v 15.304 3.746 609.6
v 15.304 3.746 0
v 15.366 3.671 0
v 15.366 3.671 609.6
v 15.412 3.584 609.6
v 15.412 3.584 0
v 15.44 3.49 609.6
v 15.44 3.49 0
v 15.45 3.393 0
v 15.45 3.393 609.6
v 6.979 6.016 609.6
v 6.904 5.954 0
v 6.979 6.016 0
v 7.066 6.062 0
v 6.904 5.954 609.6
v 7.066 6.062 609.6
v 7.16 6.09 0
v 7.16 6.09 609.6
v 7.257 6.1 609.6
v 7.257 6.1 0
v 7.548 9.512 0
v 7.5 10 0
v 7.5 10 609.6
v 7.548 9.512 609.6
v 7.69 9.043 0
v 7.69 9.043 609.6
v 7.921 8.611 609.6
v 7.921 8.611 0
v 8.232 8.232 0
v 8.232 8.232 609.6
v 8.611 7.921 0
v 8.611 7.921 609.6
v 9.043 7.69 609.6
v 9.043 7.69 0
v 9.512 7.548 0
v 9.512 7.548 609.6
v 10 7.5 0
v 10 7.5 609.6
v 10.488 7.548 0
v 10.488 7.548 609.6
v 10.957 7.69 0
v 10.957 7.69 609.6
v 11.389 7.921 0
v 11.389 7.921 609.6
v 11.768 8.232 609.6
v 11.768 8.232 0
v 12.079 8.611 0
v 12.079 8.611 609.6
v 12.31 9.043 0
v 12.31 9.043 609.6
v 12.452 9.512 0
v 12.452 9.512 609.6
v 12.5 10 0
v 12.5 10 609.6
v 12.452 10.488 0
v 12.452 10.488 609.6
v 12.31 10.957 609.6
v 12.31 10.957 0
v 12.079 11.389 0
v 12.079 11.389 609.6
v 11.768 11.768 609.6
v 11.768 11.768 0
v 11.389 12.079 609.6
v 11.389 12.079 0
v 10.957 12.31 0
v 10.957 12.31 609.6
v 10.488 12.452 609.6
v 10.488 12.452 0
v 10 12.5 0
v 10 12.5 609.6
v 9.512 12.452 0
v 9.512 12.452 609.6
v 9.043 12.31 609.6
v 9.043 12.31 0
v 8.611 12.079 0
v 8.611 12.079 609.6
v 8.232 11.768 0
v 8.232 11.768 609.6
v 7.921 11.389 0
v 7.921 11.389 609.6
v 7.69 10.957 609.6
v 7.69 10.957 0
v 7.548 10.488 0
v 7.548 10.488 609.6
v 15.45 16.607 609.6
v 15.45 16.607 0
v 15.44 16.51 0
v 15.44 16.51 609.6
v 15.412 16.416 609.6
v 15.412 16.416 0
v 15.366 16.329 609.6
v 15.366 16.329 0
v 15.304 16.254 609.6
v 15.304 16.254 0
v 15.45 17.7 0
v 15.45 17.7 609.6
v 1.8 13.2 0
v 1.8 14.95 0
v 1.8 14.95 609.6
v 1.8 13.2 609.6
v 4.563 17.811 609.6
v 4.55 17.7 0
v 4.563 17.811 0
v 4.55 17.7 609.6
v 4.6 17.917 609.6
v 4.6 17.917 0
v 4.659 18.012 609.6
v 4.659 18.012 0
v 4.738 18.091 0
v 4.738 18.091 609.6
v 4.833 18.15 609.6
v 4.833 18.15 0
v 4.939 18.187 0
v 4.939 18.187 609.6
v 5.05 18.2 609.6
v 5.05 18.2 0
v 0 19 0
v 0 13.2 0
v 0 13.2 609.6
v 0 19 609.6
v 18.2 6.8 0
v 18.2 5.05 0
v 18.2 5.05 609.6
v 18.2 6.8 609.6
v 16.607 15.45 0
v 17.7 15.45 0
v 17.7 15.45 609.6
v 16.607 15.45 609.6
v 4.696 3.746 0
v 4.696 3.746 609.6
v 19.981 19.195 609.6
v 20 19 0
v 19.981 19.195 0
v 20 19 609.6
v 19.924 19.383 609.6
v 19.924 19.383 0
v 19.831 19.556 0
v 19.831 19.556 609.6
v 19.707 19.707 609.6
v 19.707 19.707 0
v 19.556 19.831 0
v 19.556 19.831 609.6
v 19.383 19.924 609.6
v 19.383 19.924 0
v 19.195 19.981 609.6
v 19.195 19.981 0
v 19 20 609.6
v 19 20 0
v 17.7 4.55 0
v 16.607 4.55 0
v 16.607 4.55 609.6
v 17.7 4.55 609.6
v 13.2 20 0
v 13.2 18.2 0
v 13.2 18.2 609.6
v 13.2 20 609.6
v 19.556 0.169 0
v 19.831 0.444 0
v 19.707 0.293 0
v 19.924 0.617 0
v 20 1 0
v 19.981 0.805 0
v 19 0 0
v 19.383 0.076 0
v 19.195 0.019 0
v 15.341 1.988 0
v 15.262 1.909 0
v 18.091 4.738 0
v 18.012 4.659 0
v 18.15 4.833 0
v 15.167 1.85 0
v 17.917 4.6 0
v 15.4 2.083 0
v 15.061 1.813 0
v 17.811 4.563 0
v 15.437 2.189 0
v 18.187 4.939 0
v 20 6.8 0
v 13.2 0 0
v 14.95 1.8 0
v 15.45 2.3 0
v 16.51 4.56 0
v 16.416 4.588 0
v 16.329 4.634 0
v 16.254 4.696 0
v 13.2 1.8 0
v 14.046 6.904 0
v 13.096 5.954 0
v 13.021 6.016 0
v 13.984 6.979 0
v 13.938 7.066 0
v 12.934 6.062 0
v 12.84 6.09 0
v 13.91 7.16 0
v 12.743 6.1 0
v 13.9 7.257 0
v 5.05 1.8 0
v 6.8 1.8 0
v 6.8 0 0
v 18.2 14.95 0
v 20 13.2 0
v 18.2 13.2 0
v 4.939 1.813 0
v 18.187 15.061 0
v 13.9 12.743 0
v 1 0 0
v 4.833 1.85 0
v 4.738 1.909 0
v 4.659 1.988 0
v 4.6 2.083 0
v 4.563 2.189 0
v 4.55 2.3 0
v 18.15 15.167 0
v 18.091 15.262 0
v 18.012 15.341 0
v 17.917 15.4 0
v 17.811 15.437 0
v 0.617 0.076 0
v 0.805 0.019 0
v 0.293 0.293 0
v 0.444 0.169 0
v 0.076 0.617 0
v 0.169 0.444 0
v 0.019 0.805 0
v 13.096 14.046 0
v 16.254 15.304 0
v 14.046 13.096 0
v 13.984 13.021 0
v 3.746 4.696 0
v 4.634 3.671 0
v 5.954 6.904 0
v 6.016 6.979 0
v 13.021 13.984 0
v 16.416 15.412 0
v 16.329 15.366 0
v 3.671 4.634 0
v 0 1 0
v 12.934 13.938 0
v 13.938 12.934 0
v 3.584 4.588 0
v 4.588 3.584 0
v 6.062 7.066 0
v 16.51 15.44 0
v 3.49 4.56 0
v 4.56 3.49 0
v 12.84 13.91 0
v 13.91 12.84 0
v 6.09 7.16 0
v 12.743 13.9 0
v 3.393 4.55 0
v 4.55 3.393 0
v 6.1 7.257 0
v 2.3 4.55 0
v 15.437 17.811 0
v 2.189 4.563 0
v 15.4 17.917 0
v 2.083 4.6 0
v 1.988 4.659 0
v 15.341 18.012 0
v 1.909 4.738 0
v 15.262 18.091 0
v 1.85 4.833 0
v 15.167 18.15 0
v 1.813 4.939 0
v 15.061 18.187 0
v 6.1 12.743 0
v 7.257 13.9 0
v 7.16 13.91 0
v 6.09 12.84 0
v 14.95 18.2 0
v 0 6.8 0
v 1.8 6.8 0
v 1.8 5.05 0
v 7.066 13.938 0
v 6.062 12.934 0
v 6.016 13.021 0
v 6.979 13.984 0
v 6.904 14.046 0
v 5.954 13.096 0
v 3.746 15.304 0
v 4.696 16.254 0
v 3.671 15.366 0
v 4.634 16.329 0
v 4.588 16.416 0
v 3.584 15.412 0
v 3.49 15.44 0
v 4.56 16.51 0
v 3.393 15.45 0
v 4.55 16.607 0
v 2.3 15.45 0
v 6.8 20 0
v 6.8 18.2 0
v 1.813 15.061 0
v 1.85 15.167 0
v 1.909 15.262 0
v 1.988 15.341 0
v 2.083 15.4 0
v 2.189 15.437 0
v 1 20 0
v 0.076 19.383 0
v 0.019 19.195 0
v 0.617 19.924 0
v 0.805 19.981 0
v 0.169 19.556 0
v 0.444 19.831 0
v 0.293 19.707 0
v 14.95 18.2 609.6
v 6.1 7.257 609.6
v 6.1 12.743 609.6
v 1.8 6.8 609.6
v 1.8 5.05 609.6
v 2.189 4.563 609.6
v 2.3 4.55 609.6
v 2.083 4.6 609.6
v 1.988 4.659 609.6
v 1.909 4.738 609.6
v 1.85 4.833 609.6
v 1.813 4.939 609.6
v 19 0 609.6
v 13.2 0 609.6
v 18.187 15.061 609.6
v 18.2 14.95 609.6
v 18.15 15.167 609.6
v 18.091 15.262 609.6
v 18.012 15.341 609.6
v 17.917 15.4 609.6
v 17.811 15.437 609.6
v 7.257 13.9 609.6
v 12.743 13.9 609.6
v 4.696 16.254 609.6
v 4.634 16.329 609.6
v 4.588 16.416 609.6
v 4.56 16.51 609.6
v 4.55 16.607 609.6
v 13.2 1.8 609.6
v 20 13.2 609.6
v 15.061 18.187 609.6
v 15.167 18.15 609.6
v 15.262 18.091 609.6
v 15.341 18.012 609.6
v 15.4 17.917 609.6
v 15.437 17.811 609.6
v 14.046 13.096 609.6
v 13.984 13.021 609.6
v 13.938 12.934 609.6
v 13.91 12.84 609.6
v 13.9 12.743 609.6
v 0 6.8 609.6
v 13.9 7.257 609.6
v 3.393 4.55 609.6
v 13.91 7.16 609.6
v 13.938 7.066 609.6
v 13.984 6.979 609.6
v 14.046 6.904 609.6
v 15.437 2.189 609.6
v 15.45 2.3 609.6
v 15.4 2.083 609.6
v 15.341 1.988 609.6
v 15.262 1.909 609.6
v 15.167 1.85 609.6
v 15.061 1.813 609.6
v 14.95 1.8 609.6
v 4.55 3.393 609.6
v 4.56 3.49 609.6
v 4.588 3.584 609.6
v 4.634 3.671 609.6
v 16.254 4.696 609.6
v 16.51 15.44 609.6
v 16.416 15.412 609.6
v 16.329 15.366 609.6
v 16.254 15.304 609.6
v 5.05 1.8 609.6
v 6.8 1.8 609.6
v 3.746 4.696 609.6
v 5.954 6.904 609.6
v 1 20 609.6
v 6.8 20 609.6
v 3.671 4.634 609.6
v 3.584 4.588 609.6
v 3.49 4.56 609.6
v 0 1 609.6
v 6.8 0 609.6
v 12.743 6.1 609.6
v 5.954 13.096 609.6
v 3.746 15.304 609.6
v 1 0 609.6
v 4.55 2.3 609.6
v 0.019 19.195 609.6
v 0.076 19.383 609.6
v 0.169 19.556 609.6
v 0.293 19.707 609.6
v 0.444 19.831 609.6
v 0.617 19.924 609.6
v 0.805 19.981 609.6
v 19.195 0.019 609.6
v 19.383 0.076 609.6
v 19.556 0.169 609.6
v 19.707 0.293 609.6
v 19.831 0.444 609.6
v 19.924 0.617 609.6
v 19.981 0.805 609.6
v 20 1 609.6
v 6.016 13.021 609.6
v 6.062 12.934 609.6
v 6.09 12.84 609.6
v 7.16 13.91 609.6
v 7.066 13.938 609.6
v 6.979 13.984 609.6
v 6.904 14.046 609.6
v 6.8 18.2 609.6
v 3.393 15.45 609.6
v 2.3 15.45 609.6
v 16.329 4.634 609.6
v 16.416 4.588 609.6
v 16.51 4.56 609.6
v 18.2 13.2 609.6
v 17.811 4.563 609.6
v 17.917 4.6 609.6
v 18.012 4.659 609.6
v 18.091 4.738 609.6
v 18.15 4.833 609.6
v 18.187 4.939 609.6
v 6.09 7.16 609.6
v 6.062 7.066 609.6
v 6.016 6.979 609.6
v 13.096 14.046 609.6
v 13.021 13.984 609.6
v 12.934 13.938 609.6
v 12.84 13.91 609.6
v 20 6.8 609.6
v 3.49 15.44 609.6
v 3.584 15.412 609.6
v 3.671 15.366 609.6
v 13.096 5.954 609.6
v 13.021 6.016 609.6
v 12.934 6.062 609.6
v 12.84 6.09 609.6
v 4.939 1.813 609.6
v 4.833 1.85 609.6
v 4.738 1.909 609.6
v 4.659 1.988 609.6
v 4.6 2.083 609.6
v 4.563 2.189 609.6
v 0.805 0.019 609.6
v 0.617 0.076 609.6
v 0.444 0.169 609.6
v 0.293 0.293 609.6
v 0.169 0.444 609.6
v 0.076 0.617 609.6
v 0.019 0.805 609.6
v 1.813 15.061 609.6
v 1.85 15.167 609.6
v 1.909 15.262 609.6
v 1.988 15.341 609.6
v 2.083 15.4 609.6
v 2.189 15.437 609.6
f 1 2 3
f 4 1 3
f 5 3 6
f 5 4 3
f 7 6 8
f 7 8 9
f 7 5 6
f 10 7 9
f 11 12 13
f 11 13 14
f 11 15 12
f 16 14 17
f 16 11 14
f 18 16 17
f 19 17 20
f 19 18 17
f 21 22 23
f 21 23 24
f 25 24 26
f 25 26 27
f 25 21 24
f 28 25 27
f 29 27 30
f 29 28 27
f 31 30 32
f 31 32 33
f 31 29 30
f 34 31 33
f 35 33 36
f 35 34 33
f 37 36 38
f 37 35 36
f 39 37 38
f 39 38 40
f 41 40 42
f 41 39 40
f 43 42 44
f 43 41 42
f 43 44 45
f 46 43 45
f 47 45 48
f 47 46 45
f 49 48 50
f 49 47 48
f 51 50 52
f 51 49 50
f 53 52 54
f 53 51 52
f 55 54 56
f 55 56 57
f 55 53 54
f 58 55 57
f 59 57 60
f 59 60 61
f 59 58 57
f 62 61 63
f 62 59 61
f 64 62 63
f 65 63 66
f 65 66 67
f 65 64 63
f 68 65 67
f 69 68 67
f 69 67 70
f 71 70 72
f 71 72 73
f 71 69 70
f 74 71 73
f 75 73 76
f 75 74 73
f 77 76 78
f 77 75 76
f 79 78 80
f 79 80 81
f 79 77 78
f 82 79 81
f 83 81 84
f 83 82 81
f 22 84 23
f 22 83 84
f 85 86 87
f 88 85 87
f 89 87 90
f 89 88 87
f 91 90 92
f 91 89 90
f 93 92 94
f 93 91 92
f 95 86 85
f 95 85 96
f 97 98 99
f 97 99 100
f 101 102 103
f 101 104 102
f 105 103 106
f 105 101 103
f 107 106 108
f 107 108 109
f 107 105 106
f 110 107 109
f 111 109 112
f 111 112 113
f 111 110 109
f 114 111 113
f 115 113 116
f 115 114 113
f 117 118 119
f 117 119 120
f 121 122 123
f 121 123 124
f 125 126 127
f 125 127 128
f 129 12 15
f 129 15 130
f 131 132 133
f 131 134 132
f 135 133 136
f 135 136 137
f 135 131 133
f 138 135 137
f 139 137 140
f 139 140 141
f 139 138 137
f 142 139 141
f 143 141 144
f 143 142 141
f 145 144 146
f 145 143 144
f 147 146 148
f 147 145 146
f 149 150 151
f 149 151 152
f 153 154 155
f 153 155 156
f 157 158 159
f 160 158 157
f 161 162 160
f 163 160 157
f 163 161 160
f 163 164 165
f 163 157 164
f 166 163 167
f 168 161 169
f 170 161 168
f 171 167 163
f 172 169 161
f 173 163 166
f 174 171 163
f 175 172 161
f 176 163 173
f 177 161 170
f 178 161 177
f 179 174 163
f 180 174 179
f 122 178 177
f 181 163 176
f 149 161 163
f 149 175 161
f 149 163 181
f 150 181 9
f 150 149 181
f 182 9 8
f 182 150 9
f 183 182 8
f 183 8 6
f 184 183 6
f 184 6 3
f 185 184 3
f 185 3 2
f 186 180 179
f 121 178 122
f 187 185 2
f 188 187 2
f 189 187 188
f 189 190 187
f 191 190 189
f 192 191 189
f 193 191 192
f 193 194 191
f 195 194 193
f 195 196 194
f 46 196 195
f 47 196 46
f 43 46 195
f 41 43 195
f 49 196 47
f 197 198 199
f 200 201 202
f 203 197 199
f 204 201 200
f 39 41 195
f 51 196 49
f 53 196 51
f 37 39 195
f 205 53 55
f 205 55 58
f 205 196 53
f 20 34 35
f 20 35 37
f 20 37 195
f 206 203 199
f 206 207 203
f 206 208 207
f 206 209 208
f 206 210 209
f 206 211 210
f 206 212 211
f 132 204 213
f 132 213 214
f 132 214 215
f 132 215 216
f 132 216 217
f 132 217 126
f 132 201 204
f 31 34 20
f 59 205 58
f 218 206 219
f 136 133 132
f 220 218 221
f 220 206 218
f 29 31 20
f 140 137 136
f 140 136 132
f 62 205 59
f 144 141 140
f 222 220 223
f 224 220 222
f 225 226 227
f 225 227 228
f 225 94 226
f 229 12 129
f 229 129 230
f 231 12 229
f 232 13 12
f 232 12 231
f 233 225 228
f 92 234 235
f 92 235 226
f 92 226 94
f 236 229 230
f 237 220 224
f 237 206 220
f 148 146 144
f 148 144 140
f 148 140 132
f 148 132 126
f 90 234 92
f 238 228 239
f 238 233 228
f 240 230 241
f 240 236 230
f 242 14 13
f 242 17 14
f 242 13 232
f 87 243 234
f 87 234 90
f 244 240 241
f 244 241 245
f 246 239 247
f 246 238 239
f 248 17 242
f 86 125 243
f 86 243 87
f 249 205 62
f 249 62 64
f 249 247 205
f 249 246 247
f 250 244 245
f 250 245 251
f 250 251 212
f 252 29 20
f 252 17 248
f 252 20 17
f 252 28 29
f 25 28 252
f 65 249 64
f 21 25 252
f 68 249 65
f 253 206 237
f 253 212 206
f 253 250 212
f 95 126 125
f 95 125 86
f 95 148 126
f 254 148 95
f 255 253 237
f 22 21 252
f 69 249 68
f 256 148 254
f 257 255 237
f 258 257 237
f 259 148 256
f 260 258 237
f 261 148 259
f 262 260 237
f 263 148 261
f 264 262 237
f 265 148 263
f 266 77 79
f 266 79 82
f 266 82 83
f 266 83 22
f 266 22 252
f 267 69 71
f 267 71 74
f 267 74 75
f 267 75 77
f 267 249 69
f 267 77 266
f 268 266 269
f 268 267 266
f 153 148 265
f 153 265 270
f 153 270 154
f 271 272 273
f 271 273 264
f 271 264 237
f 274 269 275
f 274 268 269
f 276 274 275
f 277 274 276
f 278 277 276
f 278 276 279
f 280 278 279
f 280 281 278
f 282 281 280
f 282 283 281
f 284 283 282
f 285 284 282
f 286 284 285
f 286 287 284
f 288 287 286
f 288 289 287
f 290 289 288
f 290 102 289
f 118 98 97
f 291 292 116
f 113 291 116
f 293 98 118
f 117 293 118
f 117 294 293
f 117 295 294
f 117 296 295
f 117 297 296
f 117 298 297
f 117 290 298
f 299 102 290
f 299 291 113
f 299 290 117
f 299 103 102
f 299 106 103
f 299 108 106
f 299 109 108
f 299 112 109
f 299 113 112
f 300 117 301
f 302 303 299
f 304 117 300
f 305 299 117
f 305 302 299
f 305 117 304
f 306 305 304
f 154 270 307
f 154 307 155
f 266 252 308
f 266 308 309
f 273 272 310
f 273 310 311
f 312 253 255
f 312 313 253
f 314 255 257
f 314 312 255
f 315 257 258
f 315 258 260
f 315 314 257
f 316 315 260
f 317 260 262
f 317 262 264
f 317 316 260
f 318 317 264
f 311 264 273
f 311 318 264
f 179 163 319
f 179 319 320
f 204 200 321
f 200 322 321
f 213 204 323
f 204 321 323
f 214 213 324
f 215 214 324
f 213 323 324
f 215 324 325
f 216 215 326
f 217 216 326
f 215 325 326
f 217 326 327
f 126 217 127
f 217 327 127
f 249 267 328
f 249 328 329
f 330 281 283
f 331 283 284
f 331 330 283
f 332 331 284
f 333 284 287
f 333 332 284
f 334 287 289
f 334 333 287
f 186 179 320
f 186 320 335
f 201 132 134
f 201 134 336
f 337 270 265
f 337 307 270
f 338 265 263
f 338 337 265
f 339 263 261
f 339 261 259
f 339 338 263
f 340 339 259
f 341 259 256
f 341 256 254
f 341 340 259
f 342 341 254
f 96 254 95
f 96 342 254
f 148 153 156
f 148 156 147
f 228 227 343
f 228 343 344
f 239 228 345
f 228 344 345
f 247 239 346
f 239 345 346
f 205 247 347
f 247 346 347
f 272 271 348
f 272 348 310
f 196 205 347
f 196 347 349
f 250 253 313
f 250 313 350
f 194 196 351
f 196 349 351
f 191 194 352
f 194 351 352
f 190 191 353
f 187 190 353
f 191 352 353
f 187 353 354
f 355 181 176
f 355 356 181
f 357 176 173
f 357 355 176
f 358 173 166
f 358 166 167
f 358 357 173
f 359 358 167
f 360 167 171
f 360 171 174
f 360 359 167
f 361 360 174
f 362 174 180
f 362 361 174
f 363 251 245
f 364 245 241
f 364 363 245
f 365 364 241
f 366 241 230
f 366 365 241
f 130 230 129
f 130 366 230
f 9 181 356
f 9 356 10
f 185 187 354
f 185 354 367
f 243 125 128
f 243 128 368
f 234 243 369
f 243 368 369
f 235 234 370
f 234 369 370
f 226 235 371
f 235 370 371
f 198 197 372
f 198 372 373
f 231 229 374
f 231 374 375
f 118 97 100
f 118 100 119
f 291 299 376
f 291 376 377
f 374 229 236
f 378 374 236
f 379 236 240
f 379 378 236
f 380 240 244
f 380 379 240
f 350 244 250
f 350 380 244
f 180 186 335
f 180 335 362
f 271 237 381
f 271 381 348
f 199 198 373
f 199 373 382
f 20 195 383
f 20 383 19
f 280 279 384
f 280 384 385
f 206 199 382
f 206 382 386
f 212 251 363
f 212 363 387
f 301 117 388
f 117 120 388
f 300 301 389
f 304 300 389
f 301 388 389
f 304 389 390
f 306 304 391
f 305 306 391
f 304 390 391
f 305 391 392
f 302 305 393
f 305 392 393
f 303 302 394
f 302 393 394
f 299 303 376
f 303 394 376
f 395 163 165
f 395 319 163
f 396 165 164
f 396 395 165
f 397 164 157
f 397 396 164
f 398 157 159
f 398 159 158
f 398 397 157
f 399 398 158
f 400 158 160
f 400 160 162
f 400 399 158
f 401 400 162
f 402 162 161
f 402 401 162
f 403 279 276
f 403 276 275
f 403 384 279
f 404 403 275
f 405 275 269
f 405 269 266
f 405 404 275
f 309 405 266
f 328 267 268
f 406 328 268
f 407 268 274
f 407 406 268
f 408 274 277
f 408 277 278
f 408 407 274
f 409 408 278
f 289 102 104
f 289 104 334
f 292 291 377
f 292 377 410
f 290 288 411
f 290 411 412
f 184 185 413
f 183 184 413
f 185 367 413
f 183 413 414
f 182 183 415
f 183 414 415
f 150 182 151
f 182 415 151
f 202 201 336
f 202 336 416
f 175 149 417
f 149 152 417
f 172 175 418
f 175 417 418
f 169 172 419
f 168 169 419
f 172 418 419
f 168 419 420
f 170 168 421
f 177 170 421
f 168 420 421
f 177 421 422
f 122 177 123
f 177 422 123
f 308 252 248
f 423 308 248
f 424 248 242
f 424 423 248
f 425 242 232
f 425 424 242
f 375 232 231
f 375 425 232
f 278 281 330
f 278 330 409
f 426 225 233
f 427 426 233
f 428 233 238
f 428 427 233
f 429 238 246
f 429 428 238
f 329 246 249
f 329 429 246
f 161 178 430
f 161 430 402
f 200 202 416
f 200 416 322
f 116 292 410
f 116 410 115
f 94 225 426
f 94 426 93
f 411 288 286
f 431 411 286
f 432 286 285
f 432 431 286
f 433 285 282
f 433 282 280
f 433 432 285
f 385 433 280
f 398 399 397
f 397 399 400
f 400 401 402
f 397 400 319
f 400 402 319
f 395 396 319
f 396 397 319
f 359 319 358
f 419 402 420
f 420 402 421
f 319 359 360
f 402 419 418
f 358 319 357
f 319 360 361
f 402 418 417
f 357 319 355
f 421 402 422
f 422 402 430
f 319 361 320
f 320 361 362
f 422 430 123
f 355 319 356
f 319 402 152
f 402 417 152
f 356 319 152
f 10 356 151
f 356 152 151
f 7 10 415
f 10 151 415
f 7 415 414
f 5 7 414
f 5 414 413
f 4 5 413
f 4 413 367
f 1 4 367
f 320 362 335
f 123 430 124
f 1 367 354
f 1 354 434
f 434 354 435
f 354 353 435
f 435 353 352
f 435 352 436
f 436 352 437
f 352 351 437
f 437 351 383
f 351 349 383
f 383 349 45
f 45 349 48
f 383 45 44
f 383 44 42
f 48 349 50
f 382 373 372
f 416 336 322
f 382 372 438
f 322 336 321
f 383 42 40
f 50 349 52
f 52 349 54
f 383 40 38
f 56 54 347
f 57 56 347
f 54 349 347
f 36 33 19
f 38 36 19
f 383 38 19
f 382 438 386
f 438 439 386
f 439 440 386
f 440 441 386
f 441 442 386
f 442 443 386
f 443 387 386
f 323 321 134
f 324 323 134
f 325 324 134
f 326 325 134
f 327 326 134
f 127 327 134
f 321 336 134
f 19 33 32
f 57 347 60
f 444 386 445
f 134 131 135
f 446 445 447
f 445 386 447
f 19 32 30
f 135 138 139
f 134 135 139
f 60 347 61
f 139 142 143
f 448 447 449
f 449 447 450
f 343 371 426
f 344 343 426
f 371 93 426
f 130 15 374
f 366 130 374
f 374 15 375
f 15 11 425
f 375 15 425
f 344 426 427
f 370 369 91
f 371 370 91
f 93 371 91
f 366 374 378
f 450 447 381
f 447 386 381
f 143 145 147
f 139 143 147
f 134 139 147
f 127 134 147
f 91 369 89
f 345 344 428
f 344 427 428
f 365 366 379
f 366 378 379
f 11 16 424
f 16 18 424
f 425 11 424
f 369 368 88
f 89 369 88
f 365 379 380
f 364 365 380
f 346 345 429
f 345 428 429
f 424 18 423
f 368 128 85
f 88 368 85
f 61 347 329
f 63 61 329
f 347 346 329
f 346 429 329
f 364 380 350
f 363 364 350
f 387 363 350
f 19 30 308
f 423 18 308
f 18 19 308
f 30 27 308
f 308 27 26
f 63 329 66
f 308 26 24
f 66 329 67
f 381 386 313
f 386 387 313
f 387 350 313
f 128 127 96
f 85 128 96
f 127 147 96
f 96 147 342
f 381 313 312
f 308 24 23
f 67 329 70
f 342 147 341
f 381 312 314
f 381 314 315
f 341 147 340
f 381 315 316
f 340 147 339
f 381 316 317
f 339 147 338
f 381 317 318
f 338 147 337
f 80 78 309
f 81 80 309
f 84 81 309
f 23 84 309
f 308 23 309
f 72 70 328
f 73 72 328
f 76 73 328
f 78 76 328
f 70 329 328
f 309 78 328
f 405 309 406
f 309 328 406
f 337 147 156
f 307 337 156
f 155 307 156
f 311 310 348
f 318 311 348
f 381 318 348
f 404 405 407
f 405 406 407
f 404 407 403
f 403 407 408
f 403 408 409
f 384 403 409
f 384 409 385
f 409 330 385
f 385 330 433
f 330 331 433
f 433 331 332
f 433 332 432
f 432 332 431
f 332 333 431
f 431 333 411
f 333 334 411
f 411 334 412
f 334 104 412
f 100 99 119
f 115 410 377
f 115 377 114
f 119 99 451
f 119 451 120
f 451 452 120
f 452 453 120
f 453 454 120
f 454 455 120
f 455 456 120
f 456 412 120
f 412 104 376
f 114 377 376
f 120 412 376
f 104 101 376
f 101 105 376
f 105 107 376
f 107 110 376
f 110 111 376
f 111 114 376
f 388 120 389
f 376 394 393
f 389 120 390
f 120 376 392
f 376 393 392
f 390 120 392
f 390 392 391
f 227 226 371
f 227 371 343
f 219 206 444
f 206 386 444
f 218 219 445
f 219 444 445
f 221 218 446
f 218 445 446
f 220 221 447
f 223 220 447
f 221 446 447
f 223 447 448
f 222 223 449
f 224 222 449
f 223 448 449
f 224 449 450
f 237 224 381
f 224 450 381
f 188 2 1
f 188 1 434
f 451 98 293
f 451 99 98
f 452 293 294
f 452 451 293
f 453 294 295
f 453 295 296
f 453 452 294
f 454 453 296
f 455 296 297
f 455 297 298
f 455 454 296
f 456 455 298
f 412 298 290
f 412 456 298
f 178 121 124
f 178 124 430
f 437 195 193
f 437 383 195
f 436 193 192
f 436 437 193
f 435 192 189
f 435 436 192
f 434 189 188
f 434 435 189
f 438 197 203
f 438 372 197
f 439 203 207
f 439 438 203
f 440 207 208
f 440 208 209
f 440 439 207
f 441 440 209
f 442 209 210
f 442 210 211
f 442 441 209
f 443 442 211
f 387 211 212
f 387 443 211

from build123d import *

# Parameters (mm, degrees)
SKETCH1_R           = 2.5
BOSS_EXTRUDE1_DEPTH = 609.6
FILLET1_R           = 1
FILLET2_R           = 0.5
FILLET3_R           = 0.5
FILLET4_R           = 0.5
FILLET5_R           = 0.5


with BuildPart() as part:
    # Sketch1 → Boss-Extrude1 (new body)
    with BuildSketch(Plane.XY):
        Polygon((13.2, 0), (13.2, 1.8), (15.45, 1.8), (15.45, 3.6), (12.95, 6.1), (7.05, 6.1), (4.55, 3.6), (4.55, 1.8), (6.8, 1.8), (6.8, 0), (0, 0), (0, 6.8), (1.8, 6.8), (1.8, 4.55), (3.6, 4.55), (6.1, 7.05), (6.1, 12.95), (3.6, 15.45), (1.8, 15.45), (1.8, 13.2), (0, 13.2), (0, 20), (6.8, 20), (6.8, 18.2), (4.55, 18.2), (4.55, 16.4), (7.05, 13.9), (12.95, 13.9), (15.45, 16.4), (15.45, 18.2), (13.2, 18.2), (13.2, 20), (20, 20), (20, 13.2), (18.2, 13.2), (18.2, 15.45), (16.4, 15.45), (13.9, 12.95), (13.9, 7.05), (16.4, 4.55), (18.2, 4.55), (18.2, 6.8), (20, 6.8), (20, 0), align=None)
        with Locations(Location((10, 10, 0), (0, 0, 180))):
            Circle(SKETCH1_R, mode=Mode.SUBTRACT)
    extrude(amount=BOSS_EXTRUDE1_DEPTH)

    # Fillet1
    fillet1_edges = [part.edges().sort_by_distance(p)[0] for p in [
        (0, 0, 304.8),
        (0, 20, 304.8),
        (20, 20, 304.8),
        (20, 0, 304.8),
    ]]
    fillet(fillet1_edges, radius=FILLET1_R)

    # Fillet2
    fillet2_edges = [part.edges().sort_by_distance(p)[0] for p in [
        (4.55, 18.2, 304.8),
        (4.55, 16.4, 304.8),
        (7.05, 13.9, 304.8),
        (12.95, 13.9, 304.8),
        (15.45, 16.4, 304.8),
        (15.45, 18.2, 304.8),
    ]]
    fillet(fillet2_edges, radius=FILLET2_R)

    # Fillet3
    fillet3_edges = [part.edges().sort_by_distance(p)[0] for p in [
        (18.2, 15.45, 304.8),
        (16.4, 15.45, 304.8),
        (13.9, 12.95, 304.8),
        (13.9, 7.05, 304.8),
        (16.4, 4.55, 304.8),
        (18.2, 4.55, 304.8),
    ]]
    fillet(fillet3_edges, radius=FILLET3_R)

    # Fillet4
    fillet4_edges = [part.edges().sort_by_distance(p)[0] for p in [
        (1.8, 4.55, 304.8),
        (3.6, 4.55, 304.8),
        (6.1, 7.05, 304.8),
        (6.1, 12.95, 304.8),
        (3.6, 15.45, 304.8),
        (1.8, 15.45, 304.8),
    ]]
    fillet(fillet4_edges, radius=FILLET4_R)

    # Fillet5
    fillet5_edges = [part.edges().sort_by_distance(p)[0] for p in [
        (15.45, 1.8, 304.8),
        (15.45, 3.6, 304.8),
        (12.95, 6.1, 304.8),
        (7.05, 6.1, 304.8),
        (4.55, 3.6, 304.8),
        (4.55, 1.8, 304.8),
    ]]
    fillet(fillet5_edges, radius=FILLET5_R)


solid = part.part
